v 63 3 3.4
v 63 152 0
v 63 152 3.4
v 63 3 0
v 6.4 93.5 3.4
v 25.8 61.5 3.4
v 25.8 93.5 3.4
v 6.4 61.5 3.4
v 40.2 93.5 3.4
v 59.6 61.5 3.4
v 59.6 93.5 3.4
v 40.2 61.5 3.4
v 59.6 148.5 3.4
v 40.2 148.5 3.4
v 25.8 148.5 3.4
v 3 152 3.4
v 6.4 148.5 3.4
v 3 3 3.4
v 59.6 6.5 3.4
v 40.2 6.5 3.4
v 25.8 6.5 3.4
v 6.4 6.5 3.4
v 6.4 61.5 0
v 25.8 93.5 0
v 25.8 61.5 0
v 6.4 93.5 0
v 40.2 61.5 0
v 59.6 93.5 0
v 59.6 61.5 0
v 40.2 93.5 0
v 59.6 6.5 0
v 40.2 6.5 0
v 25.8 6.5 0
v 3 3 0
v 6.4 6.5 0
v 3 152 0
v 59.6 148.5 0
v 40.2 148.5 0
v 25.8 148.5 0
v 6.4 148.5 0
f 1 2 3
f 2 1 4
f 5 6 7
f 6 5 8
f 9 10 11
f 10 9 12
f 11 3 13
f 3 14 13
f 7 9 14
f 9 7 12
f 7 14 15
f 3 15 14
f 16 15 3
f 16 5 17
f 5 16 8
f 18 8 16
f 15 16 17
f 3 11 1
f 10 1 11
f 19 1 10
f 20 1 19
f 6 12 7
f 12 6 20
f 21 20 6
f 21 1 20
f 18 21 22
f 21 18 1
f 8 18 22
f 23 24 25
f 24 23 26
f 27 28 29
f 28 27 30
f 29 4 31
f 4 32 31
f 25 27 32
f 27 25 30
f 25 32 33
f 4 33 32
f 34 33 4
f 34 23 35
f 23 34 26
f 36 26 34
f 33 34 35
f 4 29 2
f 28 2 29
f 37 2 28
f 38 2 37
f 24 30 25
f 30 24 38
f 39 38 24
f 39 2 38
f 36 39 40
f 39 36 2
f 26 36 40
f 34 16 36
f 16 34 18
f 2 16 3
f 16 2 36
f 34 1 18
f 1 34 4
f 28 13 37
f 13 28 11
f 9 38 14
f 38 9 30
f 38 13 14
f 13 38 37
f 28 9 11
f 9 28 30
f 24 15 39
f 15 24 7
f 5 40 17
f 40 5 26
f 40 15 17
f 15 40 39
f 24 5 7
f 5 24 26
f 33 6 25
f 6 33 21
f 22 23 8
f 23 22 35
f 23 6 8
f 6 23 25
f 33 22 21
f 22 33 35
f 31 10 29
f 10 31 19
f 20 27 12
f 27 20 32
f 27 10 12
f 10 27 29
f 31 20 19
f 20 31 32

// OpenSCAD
t=3.4;
w=66;
h=155;

dc=53; //Depth Camera
wc=17.4; //Width Camera
ct=7.5; //Camera Top?
cl=7.4; //Camera Left?

tc=1; //Toleranz Camera

mp=3; //Minmize plate

module camera()
{
    color("red")
cube([wc+tc+tc, dc+tc+tc, t]);
}

difference()
{
    translate([mp,mp,0])
cube([w-mp-mp,h-mp-mp,t]);

translate([w-wc-cl-tc,h-dc-ct-tc,0])
camera();
    
    translate([cl-tc,h-dc-ct-tc,0])
camera();
    
    translate([cl-tc,ct-tc,0])
camera();
    
    
translate([w-wc-cl-tc,ct-tc,0])
camera();
}
